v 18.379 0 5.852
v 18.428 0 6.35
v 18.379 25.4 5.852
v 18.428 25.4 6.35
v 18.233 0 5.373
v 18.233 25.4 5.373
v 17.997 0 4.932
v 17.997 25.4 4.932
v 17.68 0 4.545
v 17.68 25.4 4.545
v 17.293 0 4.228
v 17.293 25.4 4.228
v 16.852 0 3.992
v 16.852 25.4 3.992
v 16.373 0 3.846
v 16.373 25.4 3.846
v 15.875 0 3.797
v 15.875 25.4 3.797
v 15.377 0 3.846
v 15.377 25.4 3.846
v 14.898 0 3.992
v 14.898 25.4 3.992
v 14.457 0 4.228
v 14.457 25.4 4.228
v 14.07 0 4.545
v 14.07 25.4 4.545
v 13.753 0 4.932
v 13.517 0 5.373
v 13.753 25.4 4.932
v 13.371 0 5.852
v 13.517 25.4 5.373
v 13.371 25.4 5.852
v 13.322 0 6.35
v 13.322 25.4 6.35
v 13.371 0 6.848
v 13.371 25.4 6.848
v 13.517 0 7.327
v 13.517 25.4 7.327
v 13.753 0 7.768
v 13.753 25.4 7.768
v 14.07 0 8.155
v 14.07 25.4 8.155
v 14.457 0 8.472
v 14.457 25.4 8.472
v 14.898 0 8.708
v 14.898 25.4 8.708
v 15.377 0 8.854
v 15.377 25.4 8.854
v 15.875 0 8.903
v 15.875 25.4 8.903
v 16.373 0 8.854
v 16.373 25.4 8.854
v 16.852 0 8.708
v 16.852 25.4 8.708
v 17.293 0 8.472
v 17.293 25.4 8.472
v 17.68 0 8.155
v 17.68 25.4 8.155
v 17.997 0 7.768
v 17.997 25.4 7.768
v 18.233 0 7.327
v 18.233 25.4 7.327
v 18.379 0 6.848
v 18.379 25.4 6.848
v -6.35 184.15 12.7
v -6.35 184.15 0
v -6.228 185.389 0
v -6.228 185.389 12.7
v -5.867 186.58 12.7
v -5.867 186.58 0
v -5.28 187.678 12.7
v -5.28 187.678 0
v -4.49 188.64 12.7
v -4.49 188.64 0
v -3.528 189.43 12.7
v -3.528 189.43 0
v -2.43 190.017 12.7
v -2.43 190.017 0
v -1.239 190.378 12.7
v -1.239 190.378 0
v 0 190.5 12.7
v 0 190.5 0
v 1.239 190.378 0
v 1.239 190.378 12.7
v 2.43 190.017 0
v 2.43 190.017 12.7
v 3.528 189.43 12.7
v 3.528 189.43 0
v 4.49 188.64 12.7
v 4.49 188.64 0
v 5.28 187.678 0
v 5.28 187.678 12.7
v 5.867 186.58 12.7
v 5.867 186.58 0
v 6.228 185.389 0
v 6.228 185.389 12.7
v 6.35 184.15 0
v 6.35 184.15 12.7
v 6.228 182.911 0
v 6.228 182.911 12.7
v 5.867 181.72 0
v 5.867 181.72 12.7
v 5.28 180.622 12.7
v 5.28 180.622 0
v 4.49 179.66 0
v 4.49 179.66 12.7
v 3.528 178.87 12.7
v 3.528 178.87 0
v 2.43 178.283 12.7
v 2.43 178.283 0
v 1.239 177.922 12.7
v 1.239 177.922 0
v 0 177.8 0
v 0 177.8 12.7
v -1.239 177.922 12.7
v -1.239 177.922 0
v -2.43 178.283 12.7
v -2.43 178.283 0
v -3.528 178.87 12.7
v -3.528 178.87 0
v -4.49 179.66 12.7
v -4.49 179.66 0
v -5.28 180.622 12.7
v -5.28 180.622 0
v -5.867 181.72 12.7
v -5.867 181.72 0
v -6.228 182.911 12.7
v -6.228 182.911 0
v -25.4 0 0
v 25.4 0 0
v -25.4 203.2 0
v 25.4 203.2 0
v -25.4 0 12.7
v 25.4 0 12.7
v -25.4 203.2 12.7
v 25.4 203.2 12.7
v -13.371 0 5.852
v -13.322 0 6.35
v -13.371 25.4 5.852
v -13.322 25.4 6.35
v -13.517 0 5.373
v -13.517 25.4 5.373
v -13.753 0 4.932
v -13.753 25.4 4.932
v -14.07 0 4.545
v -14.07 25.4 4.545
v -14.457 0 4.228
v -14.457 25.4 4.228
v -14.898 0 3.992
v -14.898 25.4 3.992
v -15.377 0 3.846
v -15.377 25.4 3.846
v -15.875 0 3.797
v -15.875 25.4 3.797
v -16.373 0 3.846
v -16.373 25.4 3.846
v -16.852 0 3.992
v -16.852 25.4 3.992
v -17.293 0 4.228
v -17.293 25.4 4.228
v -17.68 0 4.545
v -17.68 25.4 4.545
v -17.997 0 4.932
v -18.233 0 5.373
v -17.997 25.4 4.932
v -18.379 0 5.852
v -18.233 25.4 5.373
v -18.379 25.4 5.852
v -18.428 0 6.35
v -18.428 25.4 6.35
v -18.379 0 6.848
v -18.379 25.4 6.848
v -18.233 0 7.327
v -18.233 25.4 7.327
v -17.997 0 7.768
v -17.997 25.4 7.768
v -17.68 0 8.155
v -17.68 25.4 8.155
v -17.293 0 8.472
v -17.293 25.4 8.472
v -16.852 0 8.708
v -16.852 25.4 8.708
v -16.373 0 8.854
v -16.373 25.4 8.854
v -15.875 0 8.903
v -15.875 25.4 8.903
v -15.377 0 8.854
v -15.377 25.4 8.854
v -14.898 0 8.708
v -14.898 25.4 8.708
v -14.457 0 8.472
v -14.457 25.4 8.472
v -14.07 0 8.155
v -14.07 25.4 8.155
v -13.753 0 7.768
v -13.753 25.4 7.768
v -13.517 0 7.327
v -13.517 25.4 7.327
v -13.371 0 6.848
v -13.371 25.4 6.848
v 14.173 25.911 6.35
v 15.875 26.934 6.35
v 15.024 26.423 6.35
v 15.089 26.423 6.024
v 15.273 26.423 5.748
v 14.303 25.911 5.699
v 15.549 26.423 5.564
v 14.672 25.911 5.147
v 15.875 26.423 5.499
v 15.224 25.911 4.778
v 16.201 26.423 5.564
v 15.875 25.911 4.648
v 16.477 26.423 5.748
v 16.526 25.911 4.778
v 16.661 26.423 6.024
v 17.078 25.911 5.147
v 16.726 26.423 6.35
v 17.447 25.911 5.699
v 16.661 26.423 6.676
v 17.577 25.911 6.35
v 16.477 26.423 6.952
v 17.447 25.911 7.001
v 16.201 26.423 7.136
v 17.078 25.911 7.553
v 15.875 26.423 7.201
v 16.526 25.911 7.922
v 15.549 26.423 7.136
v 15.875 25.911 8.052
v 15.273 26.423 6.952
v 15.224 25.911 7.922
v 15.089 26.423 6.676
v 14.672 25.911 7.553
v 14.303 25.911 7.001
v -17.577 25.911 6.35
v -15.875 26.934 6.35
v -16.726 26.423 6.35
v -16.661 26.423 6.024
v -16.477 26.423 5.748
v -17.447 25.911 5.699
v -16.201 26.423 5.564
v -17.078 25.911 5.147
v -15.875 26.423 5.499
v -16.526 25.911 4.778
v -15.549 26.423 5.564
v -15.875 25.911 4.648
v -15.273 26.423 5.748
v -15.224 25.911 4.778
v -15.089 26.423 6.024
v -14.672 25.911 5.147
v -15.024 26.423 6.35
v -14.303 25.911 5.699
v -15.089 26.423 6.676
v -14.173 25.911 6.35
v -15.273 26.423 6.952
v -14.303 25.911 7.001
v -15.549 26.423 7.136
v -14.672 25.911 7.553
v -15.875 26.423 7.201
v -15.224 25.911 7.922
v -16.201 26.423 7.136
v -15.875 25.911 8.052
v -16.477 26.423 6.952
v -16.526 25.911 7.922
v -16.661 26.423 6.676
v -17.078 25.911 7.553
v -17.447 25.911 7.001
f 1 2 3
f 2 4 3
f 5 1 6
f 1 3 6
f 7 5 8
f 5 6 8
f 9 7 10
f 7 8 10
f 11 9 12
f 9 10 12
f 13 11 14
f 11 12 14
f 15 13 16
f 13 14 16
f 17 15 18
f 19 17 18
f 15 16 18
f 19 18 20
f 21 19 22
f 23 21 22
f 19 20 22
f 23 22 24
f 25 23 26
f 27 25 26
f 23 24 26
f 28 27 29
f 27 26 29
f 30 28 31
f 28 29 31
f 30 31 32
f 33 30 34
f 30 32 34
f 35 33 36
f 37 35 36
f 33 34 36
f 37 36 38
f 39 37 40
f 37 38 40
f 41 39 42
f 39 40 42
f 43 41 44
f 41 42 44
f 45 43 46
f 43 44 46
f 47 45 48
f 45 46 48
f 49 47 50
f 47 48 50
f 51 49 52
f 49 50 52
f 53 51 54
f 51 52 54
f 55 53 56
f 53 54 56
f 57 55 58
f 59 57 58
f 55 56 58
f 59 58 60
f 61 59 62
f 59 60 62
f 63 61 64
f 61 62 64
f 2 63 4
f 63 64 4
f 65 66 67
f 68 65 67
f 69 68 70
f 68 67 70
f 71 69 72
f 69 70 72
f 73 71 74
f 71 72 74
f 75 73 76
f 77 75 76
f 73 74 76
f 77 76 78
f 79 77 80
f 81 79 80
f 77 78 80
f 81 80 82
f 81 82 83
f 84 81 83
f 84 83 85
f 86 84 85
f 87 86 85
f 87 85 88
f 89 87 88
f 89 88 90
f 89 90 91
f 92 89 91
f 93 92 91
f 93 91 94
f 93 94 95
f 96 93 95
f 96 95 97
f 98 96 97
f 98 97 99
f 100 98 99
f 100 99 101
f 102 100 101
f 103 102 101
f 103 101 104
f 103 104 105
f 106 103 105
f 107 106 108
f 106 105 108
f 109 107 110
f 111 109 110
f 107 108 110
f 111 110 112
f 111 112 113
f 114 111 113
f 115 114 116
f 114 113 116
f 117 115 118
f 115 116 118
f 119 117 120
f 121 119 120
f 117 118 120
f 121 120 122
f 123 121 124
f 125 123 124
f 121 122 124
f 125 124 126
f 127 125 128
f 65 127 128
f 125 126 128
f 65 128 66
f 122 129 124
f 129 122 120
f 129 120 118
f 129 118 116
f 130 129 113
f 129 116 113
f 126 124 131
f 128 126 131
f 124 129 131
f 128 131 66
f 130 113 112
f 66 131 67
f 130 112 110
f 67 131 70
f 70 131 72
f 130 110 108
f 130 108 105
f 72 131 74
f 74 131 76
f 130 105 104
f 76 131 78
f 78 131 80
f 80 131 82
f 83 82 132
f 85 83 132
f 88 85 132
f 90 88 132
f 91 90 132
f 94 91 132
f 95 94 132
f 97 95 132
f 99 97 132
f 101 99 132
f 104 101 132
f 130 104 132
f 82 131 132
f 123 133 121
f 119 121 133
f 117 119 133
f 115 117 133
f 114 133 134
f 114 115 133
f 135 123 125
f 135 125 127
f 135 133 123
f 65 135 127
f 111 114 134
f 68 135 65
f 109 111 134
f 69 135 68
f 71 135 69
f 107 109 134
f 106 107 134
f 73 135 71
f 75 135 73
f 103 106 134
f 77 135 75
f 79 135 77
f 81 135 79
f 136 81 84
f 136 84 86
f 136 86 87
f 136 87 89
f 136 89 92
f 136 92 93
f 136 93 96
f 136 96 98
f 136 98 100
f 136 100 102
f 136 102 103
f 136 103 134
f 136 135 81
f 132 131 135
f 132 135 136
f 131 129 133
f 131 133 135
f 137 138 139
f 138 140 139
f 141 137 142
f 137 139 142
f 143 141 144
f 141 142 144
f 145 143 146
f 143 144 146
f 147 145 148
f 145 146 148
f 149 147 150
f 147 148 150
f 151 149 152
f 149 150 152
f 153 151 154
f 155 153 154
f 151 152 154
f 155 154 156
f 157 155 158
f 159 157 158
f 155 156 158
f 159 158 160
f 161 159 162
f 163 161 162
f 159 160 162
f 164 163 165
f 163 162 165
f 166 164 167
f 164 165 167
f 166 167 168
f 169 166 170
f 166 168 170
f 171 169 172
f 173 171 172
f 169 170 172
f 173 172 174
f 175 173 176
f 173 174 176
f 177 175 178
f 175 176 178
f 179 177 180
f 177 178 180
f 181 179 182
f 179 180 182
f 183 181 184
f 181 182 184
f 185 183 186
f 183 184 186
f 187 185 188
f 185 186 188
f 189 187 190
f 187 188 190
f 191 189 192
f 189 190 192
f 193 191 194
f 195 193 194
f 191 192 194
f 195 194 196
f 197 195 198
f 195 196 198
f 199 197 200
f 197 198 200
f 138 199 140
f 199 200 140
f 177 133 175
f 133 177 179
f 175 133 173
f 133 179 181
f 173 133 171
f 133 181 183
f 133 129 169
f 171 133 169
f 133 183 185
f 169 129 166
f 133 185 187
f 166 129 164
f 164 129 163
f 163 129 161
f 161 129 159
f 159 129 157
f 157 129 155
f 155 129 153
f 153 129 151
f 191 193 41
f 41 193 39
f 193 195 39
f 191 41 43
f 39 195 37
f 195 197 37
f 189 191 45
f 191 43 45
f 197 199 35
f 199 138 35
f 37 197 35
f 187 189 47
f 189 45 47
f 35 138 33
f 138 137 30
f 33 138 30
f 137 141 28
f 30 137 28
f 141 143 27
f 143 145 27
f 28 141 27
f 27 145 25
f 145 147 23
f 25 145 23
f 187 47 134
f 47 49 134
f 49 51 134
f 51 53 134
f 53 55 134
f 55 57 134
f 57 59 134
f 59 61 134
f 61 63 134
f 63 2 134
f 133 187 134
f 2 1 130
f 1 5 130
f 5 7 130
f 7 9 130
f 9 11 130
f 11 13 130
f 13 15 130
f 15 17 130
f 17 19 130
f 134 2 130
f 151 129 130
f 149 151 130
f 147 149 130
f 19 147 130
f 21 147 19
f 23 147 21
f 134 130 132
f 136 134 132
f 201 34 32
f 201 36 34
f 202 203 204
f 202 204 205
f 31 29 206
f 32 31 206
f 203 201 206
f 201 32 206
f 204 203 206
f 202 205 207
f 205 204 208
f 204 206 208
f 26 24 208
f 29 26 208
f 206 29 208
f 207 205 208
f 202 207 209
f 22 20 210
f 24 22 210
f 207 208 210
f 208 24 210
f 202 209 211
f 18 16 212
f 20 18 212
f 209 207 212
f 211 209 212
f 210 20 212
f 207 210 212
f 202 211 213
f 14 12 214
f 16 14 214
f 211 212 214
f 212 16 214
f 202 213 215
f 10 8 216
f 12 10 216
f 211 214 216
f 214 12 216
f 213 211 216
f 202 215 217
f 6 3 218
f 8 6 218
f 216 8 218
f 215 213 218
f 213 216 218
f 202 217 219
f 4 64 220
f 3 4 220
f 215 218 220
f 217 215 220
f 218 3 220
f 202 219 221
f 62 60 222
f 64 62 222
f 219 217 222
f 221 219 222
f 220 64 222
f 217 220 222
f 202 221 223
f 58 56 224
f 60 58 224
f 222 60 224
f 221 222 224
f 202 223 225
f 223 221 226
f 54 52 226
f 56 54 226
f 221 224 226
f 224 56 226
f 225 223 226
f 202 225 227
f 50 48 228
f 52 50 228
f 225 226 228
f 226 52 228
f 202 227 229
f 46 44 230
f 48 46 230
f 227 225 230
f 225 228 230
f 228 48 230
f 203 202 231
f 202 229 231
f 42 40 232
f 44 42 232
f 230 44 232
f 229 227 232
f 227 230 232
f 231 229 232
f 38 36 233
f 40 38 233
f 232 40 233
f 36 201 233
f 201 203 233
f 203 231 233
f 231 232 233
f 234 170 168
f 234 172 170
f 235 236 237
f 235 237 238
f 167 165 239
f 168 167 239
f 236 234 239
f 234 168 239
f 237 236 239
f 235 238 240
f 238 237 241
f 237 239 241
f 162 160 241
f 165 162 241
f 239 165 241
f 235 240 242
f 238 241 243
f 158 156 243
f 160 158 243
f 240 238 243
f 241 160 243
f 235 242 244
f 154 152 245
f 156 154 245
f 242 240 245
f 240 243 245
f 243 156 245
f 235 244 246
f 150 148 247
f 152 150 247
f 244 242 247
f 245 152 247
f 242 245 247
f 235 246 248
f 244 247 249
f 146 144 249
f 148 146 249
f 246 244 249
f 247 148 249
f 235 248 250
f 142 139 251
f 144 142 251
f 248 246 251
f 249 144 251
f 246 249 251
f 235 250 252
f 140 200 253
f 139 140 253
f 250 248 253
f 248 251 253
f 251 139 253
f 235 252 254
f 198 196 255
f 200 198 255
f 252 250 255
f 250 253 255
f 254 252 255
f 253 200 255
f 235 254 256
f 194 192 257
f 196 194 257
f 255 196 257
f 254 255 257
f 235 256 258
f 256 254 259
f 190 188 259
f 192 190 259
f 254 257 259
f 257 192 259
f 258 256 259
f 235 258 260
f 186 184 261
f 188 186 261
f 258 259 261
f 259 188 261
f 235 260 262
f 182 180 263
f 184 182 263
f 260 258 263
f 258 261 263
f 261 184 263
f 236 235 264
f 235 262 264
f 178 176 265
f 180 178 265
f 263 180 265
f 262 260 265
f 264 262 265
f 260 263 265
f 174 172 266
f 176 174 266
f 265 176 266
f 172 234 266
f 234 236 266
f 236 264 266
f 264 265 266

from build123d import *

# Parameters (mm, degrees)
SKETCH1_W                   = 50.8
SKETCH1_H                   = 203.2
BOSS_EXTRUDE1_DEPTH         = 12.7
F_1_4_20_TAPPED_HOLE1_D     = 5.1054
F_1_4_20_TAPPED_HOLE1_DEPTH = 25.4
F_1_4_20_TAPPED_HOLE1_TIP   = 1.533816902
SKETCH4_R                   = 6.35
CUT_EXTRUDE1_DEPTH          = 13.7


with BuildPart() as part:
    # Sketch1 → Boss-Extrude1 (new body)
    with BuildSketch(Plane.XY):
        with Locations((0, 101.6)):
            Rectangle(SKETCH1_W, SKETCH1_H)
    extrude(amount=BOSS_EXTRUDE1_DEPTH)

    # 1/4-20 Tapped Hole1
    with Locations(Plane(origin=(0, 0, 0), x_dir=(-1, 0, 0), z_dir=(0, -1, 0))):
        with Locations((15.875, -6.35), (-15.875, -6.35)):
            Hole(F_1_4_20_TAPPED_HOLE1_D / 2, depth=F_1_4_20_TAPPED_HOLE1_DEPTH)
            with Locations((0, 0, -(F_1_4_20_TAPPED_HOLE1_DEPTH + F_1_4_20_TAPPED_HOLE1_TIP / 2))):  # 118° drill point
                Cone(0, F_1_4_20_TAPPED_HOLE1_D / 2, F_1_4_20_TAPPED_HOLE1_TIP, mode=Mode.SUBTRACT)

    # Sketch4 → Cut-Extrude1 (cut, through all)
    with BuildSketch(Plane(origin=(0, 0, 0), x_dir=(-1, 0, 0), z_dir=(0, 0, -1))):
        with Locations((0, 184.15)):
            Circle(SKETCH4_R)
    extrude(amount=-CUT_EXTRUDE1_DEPTH, mode=Mode.SUBTRACT)


solid = part.part
